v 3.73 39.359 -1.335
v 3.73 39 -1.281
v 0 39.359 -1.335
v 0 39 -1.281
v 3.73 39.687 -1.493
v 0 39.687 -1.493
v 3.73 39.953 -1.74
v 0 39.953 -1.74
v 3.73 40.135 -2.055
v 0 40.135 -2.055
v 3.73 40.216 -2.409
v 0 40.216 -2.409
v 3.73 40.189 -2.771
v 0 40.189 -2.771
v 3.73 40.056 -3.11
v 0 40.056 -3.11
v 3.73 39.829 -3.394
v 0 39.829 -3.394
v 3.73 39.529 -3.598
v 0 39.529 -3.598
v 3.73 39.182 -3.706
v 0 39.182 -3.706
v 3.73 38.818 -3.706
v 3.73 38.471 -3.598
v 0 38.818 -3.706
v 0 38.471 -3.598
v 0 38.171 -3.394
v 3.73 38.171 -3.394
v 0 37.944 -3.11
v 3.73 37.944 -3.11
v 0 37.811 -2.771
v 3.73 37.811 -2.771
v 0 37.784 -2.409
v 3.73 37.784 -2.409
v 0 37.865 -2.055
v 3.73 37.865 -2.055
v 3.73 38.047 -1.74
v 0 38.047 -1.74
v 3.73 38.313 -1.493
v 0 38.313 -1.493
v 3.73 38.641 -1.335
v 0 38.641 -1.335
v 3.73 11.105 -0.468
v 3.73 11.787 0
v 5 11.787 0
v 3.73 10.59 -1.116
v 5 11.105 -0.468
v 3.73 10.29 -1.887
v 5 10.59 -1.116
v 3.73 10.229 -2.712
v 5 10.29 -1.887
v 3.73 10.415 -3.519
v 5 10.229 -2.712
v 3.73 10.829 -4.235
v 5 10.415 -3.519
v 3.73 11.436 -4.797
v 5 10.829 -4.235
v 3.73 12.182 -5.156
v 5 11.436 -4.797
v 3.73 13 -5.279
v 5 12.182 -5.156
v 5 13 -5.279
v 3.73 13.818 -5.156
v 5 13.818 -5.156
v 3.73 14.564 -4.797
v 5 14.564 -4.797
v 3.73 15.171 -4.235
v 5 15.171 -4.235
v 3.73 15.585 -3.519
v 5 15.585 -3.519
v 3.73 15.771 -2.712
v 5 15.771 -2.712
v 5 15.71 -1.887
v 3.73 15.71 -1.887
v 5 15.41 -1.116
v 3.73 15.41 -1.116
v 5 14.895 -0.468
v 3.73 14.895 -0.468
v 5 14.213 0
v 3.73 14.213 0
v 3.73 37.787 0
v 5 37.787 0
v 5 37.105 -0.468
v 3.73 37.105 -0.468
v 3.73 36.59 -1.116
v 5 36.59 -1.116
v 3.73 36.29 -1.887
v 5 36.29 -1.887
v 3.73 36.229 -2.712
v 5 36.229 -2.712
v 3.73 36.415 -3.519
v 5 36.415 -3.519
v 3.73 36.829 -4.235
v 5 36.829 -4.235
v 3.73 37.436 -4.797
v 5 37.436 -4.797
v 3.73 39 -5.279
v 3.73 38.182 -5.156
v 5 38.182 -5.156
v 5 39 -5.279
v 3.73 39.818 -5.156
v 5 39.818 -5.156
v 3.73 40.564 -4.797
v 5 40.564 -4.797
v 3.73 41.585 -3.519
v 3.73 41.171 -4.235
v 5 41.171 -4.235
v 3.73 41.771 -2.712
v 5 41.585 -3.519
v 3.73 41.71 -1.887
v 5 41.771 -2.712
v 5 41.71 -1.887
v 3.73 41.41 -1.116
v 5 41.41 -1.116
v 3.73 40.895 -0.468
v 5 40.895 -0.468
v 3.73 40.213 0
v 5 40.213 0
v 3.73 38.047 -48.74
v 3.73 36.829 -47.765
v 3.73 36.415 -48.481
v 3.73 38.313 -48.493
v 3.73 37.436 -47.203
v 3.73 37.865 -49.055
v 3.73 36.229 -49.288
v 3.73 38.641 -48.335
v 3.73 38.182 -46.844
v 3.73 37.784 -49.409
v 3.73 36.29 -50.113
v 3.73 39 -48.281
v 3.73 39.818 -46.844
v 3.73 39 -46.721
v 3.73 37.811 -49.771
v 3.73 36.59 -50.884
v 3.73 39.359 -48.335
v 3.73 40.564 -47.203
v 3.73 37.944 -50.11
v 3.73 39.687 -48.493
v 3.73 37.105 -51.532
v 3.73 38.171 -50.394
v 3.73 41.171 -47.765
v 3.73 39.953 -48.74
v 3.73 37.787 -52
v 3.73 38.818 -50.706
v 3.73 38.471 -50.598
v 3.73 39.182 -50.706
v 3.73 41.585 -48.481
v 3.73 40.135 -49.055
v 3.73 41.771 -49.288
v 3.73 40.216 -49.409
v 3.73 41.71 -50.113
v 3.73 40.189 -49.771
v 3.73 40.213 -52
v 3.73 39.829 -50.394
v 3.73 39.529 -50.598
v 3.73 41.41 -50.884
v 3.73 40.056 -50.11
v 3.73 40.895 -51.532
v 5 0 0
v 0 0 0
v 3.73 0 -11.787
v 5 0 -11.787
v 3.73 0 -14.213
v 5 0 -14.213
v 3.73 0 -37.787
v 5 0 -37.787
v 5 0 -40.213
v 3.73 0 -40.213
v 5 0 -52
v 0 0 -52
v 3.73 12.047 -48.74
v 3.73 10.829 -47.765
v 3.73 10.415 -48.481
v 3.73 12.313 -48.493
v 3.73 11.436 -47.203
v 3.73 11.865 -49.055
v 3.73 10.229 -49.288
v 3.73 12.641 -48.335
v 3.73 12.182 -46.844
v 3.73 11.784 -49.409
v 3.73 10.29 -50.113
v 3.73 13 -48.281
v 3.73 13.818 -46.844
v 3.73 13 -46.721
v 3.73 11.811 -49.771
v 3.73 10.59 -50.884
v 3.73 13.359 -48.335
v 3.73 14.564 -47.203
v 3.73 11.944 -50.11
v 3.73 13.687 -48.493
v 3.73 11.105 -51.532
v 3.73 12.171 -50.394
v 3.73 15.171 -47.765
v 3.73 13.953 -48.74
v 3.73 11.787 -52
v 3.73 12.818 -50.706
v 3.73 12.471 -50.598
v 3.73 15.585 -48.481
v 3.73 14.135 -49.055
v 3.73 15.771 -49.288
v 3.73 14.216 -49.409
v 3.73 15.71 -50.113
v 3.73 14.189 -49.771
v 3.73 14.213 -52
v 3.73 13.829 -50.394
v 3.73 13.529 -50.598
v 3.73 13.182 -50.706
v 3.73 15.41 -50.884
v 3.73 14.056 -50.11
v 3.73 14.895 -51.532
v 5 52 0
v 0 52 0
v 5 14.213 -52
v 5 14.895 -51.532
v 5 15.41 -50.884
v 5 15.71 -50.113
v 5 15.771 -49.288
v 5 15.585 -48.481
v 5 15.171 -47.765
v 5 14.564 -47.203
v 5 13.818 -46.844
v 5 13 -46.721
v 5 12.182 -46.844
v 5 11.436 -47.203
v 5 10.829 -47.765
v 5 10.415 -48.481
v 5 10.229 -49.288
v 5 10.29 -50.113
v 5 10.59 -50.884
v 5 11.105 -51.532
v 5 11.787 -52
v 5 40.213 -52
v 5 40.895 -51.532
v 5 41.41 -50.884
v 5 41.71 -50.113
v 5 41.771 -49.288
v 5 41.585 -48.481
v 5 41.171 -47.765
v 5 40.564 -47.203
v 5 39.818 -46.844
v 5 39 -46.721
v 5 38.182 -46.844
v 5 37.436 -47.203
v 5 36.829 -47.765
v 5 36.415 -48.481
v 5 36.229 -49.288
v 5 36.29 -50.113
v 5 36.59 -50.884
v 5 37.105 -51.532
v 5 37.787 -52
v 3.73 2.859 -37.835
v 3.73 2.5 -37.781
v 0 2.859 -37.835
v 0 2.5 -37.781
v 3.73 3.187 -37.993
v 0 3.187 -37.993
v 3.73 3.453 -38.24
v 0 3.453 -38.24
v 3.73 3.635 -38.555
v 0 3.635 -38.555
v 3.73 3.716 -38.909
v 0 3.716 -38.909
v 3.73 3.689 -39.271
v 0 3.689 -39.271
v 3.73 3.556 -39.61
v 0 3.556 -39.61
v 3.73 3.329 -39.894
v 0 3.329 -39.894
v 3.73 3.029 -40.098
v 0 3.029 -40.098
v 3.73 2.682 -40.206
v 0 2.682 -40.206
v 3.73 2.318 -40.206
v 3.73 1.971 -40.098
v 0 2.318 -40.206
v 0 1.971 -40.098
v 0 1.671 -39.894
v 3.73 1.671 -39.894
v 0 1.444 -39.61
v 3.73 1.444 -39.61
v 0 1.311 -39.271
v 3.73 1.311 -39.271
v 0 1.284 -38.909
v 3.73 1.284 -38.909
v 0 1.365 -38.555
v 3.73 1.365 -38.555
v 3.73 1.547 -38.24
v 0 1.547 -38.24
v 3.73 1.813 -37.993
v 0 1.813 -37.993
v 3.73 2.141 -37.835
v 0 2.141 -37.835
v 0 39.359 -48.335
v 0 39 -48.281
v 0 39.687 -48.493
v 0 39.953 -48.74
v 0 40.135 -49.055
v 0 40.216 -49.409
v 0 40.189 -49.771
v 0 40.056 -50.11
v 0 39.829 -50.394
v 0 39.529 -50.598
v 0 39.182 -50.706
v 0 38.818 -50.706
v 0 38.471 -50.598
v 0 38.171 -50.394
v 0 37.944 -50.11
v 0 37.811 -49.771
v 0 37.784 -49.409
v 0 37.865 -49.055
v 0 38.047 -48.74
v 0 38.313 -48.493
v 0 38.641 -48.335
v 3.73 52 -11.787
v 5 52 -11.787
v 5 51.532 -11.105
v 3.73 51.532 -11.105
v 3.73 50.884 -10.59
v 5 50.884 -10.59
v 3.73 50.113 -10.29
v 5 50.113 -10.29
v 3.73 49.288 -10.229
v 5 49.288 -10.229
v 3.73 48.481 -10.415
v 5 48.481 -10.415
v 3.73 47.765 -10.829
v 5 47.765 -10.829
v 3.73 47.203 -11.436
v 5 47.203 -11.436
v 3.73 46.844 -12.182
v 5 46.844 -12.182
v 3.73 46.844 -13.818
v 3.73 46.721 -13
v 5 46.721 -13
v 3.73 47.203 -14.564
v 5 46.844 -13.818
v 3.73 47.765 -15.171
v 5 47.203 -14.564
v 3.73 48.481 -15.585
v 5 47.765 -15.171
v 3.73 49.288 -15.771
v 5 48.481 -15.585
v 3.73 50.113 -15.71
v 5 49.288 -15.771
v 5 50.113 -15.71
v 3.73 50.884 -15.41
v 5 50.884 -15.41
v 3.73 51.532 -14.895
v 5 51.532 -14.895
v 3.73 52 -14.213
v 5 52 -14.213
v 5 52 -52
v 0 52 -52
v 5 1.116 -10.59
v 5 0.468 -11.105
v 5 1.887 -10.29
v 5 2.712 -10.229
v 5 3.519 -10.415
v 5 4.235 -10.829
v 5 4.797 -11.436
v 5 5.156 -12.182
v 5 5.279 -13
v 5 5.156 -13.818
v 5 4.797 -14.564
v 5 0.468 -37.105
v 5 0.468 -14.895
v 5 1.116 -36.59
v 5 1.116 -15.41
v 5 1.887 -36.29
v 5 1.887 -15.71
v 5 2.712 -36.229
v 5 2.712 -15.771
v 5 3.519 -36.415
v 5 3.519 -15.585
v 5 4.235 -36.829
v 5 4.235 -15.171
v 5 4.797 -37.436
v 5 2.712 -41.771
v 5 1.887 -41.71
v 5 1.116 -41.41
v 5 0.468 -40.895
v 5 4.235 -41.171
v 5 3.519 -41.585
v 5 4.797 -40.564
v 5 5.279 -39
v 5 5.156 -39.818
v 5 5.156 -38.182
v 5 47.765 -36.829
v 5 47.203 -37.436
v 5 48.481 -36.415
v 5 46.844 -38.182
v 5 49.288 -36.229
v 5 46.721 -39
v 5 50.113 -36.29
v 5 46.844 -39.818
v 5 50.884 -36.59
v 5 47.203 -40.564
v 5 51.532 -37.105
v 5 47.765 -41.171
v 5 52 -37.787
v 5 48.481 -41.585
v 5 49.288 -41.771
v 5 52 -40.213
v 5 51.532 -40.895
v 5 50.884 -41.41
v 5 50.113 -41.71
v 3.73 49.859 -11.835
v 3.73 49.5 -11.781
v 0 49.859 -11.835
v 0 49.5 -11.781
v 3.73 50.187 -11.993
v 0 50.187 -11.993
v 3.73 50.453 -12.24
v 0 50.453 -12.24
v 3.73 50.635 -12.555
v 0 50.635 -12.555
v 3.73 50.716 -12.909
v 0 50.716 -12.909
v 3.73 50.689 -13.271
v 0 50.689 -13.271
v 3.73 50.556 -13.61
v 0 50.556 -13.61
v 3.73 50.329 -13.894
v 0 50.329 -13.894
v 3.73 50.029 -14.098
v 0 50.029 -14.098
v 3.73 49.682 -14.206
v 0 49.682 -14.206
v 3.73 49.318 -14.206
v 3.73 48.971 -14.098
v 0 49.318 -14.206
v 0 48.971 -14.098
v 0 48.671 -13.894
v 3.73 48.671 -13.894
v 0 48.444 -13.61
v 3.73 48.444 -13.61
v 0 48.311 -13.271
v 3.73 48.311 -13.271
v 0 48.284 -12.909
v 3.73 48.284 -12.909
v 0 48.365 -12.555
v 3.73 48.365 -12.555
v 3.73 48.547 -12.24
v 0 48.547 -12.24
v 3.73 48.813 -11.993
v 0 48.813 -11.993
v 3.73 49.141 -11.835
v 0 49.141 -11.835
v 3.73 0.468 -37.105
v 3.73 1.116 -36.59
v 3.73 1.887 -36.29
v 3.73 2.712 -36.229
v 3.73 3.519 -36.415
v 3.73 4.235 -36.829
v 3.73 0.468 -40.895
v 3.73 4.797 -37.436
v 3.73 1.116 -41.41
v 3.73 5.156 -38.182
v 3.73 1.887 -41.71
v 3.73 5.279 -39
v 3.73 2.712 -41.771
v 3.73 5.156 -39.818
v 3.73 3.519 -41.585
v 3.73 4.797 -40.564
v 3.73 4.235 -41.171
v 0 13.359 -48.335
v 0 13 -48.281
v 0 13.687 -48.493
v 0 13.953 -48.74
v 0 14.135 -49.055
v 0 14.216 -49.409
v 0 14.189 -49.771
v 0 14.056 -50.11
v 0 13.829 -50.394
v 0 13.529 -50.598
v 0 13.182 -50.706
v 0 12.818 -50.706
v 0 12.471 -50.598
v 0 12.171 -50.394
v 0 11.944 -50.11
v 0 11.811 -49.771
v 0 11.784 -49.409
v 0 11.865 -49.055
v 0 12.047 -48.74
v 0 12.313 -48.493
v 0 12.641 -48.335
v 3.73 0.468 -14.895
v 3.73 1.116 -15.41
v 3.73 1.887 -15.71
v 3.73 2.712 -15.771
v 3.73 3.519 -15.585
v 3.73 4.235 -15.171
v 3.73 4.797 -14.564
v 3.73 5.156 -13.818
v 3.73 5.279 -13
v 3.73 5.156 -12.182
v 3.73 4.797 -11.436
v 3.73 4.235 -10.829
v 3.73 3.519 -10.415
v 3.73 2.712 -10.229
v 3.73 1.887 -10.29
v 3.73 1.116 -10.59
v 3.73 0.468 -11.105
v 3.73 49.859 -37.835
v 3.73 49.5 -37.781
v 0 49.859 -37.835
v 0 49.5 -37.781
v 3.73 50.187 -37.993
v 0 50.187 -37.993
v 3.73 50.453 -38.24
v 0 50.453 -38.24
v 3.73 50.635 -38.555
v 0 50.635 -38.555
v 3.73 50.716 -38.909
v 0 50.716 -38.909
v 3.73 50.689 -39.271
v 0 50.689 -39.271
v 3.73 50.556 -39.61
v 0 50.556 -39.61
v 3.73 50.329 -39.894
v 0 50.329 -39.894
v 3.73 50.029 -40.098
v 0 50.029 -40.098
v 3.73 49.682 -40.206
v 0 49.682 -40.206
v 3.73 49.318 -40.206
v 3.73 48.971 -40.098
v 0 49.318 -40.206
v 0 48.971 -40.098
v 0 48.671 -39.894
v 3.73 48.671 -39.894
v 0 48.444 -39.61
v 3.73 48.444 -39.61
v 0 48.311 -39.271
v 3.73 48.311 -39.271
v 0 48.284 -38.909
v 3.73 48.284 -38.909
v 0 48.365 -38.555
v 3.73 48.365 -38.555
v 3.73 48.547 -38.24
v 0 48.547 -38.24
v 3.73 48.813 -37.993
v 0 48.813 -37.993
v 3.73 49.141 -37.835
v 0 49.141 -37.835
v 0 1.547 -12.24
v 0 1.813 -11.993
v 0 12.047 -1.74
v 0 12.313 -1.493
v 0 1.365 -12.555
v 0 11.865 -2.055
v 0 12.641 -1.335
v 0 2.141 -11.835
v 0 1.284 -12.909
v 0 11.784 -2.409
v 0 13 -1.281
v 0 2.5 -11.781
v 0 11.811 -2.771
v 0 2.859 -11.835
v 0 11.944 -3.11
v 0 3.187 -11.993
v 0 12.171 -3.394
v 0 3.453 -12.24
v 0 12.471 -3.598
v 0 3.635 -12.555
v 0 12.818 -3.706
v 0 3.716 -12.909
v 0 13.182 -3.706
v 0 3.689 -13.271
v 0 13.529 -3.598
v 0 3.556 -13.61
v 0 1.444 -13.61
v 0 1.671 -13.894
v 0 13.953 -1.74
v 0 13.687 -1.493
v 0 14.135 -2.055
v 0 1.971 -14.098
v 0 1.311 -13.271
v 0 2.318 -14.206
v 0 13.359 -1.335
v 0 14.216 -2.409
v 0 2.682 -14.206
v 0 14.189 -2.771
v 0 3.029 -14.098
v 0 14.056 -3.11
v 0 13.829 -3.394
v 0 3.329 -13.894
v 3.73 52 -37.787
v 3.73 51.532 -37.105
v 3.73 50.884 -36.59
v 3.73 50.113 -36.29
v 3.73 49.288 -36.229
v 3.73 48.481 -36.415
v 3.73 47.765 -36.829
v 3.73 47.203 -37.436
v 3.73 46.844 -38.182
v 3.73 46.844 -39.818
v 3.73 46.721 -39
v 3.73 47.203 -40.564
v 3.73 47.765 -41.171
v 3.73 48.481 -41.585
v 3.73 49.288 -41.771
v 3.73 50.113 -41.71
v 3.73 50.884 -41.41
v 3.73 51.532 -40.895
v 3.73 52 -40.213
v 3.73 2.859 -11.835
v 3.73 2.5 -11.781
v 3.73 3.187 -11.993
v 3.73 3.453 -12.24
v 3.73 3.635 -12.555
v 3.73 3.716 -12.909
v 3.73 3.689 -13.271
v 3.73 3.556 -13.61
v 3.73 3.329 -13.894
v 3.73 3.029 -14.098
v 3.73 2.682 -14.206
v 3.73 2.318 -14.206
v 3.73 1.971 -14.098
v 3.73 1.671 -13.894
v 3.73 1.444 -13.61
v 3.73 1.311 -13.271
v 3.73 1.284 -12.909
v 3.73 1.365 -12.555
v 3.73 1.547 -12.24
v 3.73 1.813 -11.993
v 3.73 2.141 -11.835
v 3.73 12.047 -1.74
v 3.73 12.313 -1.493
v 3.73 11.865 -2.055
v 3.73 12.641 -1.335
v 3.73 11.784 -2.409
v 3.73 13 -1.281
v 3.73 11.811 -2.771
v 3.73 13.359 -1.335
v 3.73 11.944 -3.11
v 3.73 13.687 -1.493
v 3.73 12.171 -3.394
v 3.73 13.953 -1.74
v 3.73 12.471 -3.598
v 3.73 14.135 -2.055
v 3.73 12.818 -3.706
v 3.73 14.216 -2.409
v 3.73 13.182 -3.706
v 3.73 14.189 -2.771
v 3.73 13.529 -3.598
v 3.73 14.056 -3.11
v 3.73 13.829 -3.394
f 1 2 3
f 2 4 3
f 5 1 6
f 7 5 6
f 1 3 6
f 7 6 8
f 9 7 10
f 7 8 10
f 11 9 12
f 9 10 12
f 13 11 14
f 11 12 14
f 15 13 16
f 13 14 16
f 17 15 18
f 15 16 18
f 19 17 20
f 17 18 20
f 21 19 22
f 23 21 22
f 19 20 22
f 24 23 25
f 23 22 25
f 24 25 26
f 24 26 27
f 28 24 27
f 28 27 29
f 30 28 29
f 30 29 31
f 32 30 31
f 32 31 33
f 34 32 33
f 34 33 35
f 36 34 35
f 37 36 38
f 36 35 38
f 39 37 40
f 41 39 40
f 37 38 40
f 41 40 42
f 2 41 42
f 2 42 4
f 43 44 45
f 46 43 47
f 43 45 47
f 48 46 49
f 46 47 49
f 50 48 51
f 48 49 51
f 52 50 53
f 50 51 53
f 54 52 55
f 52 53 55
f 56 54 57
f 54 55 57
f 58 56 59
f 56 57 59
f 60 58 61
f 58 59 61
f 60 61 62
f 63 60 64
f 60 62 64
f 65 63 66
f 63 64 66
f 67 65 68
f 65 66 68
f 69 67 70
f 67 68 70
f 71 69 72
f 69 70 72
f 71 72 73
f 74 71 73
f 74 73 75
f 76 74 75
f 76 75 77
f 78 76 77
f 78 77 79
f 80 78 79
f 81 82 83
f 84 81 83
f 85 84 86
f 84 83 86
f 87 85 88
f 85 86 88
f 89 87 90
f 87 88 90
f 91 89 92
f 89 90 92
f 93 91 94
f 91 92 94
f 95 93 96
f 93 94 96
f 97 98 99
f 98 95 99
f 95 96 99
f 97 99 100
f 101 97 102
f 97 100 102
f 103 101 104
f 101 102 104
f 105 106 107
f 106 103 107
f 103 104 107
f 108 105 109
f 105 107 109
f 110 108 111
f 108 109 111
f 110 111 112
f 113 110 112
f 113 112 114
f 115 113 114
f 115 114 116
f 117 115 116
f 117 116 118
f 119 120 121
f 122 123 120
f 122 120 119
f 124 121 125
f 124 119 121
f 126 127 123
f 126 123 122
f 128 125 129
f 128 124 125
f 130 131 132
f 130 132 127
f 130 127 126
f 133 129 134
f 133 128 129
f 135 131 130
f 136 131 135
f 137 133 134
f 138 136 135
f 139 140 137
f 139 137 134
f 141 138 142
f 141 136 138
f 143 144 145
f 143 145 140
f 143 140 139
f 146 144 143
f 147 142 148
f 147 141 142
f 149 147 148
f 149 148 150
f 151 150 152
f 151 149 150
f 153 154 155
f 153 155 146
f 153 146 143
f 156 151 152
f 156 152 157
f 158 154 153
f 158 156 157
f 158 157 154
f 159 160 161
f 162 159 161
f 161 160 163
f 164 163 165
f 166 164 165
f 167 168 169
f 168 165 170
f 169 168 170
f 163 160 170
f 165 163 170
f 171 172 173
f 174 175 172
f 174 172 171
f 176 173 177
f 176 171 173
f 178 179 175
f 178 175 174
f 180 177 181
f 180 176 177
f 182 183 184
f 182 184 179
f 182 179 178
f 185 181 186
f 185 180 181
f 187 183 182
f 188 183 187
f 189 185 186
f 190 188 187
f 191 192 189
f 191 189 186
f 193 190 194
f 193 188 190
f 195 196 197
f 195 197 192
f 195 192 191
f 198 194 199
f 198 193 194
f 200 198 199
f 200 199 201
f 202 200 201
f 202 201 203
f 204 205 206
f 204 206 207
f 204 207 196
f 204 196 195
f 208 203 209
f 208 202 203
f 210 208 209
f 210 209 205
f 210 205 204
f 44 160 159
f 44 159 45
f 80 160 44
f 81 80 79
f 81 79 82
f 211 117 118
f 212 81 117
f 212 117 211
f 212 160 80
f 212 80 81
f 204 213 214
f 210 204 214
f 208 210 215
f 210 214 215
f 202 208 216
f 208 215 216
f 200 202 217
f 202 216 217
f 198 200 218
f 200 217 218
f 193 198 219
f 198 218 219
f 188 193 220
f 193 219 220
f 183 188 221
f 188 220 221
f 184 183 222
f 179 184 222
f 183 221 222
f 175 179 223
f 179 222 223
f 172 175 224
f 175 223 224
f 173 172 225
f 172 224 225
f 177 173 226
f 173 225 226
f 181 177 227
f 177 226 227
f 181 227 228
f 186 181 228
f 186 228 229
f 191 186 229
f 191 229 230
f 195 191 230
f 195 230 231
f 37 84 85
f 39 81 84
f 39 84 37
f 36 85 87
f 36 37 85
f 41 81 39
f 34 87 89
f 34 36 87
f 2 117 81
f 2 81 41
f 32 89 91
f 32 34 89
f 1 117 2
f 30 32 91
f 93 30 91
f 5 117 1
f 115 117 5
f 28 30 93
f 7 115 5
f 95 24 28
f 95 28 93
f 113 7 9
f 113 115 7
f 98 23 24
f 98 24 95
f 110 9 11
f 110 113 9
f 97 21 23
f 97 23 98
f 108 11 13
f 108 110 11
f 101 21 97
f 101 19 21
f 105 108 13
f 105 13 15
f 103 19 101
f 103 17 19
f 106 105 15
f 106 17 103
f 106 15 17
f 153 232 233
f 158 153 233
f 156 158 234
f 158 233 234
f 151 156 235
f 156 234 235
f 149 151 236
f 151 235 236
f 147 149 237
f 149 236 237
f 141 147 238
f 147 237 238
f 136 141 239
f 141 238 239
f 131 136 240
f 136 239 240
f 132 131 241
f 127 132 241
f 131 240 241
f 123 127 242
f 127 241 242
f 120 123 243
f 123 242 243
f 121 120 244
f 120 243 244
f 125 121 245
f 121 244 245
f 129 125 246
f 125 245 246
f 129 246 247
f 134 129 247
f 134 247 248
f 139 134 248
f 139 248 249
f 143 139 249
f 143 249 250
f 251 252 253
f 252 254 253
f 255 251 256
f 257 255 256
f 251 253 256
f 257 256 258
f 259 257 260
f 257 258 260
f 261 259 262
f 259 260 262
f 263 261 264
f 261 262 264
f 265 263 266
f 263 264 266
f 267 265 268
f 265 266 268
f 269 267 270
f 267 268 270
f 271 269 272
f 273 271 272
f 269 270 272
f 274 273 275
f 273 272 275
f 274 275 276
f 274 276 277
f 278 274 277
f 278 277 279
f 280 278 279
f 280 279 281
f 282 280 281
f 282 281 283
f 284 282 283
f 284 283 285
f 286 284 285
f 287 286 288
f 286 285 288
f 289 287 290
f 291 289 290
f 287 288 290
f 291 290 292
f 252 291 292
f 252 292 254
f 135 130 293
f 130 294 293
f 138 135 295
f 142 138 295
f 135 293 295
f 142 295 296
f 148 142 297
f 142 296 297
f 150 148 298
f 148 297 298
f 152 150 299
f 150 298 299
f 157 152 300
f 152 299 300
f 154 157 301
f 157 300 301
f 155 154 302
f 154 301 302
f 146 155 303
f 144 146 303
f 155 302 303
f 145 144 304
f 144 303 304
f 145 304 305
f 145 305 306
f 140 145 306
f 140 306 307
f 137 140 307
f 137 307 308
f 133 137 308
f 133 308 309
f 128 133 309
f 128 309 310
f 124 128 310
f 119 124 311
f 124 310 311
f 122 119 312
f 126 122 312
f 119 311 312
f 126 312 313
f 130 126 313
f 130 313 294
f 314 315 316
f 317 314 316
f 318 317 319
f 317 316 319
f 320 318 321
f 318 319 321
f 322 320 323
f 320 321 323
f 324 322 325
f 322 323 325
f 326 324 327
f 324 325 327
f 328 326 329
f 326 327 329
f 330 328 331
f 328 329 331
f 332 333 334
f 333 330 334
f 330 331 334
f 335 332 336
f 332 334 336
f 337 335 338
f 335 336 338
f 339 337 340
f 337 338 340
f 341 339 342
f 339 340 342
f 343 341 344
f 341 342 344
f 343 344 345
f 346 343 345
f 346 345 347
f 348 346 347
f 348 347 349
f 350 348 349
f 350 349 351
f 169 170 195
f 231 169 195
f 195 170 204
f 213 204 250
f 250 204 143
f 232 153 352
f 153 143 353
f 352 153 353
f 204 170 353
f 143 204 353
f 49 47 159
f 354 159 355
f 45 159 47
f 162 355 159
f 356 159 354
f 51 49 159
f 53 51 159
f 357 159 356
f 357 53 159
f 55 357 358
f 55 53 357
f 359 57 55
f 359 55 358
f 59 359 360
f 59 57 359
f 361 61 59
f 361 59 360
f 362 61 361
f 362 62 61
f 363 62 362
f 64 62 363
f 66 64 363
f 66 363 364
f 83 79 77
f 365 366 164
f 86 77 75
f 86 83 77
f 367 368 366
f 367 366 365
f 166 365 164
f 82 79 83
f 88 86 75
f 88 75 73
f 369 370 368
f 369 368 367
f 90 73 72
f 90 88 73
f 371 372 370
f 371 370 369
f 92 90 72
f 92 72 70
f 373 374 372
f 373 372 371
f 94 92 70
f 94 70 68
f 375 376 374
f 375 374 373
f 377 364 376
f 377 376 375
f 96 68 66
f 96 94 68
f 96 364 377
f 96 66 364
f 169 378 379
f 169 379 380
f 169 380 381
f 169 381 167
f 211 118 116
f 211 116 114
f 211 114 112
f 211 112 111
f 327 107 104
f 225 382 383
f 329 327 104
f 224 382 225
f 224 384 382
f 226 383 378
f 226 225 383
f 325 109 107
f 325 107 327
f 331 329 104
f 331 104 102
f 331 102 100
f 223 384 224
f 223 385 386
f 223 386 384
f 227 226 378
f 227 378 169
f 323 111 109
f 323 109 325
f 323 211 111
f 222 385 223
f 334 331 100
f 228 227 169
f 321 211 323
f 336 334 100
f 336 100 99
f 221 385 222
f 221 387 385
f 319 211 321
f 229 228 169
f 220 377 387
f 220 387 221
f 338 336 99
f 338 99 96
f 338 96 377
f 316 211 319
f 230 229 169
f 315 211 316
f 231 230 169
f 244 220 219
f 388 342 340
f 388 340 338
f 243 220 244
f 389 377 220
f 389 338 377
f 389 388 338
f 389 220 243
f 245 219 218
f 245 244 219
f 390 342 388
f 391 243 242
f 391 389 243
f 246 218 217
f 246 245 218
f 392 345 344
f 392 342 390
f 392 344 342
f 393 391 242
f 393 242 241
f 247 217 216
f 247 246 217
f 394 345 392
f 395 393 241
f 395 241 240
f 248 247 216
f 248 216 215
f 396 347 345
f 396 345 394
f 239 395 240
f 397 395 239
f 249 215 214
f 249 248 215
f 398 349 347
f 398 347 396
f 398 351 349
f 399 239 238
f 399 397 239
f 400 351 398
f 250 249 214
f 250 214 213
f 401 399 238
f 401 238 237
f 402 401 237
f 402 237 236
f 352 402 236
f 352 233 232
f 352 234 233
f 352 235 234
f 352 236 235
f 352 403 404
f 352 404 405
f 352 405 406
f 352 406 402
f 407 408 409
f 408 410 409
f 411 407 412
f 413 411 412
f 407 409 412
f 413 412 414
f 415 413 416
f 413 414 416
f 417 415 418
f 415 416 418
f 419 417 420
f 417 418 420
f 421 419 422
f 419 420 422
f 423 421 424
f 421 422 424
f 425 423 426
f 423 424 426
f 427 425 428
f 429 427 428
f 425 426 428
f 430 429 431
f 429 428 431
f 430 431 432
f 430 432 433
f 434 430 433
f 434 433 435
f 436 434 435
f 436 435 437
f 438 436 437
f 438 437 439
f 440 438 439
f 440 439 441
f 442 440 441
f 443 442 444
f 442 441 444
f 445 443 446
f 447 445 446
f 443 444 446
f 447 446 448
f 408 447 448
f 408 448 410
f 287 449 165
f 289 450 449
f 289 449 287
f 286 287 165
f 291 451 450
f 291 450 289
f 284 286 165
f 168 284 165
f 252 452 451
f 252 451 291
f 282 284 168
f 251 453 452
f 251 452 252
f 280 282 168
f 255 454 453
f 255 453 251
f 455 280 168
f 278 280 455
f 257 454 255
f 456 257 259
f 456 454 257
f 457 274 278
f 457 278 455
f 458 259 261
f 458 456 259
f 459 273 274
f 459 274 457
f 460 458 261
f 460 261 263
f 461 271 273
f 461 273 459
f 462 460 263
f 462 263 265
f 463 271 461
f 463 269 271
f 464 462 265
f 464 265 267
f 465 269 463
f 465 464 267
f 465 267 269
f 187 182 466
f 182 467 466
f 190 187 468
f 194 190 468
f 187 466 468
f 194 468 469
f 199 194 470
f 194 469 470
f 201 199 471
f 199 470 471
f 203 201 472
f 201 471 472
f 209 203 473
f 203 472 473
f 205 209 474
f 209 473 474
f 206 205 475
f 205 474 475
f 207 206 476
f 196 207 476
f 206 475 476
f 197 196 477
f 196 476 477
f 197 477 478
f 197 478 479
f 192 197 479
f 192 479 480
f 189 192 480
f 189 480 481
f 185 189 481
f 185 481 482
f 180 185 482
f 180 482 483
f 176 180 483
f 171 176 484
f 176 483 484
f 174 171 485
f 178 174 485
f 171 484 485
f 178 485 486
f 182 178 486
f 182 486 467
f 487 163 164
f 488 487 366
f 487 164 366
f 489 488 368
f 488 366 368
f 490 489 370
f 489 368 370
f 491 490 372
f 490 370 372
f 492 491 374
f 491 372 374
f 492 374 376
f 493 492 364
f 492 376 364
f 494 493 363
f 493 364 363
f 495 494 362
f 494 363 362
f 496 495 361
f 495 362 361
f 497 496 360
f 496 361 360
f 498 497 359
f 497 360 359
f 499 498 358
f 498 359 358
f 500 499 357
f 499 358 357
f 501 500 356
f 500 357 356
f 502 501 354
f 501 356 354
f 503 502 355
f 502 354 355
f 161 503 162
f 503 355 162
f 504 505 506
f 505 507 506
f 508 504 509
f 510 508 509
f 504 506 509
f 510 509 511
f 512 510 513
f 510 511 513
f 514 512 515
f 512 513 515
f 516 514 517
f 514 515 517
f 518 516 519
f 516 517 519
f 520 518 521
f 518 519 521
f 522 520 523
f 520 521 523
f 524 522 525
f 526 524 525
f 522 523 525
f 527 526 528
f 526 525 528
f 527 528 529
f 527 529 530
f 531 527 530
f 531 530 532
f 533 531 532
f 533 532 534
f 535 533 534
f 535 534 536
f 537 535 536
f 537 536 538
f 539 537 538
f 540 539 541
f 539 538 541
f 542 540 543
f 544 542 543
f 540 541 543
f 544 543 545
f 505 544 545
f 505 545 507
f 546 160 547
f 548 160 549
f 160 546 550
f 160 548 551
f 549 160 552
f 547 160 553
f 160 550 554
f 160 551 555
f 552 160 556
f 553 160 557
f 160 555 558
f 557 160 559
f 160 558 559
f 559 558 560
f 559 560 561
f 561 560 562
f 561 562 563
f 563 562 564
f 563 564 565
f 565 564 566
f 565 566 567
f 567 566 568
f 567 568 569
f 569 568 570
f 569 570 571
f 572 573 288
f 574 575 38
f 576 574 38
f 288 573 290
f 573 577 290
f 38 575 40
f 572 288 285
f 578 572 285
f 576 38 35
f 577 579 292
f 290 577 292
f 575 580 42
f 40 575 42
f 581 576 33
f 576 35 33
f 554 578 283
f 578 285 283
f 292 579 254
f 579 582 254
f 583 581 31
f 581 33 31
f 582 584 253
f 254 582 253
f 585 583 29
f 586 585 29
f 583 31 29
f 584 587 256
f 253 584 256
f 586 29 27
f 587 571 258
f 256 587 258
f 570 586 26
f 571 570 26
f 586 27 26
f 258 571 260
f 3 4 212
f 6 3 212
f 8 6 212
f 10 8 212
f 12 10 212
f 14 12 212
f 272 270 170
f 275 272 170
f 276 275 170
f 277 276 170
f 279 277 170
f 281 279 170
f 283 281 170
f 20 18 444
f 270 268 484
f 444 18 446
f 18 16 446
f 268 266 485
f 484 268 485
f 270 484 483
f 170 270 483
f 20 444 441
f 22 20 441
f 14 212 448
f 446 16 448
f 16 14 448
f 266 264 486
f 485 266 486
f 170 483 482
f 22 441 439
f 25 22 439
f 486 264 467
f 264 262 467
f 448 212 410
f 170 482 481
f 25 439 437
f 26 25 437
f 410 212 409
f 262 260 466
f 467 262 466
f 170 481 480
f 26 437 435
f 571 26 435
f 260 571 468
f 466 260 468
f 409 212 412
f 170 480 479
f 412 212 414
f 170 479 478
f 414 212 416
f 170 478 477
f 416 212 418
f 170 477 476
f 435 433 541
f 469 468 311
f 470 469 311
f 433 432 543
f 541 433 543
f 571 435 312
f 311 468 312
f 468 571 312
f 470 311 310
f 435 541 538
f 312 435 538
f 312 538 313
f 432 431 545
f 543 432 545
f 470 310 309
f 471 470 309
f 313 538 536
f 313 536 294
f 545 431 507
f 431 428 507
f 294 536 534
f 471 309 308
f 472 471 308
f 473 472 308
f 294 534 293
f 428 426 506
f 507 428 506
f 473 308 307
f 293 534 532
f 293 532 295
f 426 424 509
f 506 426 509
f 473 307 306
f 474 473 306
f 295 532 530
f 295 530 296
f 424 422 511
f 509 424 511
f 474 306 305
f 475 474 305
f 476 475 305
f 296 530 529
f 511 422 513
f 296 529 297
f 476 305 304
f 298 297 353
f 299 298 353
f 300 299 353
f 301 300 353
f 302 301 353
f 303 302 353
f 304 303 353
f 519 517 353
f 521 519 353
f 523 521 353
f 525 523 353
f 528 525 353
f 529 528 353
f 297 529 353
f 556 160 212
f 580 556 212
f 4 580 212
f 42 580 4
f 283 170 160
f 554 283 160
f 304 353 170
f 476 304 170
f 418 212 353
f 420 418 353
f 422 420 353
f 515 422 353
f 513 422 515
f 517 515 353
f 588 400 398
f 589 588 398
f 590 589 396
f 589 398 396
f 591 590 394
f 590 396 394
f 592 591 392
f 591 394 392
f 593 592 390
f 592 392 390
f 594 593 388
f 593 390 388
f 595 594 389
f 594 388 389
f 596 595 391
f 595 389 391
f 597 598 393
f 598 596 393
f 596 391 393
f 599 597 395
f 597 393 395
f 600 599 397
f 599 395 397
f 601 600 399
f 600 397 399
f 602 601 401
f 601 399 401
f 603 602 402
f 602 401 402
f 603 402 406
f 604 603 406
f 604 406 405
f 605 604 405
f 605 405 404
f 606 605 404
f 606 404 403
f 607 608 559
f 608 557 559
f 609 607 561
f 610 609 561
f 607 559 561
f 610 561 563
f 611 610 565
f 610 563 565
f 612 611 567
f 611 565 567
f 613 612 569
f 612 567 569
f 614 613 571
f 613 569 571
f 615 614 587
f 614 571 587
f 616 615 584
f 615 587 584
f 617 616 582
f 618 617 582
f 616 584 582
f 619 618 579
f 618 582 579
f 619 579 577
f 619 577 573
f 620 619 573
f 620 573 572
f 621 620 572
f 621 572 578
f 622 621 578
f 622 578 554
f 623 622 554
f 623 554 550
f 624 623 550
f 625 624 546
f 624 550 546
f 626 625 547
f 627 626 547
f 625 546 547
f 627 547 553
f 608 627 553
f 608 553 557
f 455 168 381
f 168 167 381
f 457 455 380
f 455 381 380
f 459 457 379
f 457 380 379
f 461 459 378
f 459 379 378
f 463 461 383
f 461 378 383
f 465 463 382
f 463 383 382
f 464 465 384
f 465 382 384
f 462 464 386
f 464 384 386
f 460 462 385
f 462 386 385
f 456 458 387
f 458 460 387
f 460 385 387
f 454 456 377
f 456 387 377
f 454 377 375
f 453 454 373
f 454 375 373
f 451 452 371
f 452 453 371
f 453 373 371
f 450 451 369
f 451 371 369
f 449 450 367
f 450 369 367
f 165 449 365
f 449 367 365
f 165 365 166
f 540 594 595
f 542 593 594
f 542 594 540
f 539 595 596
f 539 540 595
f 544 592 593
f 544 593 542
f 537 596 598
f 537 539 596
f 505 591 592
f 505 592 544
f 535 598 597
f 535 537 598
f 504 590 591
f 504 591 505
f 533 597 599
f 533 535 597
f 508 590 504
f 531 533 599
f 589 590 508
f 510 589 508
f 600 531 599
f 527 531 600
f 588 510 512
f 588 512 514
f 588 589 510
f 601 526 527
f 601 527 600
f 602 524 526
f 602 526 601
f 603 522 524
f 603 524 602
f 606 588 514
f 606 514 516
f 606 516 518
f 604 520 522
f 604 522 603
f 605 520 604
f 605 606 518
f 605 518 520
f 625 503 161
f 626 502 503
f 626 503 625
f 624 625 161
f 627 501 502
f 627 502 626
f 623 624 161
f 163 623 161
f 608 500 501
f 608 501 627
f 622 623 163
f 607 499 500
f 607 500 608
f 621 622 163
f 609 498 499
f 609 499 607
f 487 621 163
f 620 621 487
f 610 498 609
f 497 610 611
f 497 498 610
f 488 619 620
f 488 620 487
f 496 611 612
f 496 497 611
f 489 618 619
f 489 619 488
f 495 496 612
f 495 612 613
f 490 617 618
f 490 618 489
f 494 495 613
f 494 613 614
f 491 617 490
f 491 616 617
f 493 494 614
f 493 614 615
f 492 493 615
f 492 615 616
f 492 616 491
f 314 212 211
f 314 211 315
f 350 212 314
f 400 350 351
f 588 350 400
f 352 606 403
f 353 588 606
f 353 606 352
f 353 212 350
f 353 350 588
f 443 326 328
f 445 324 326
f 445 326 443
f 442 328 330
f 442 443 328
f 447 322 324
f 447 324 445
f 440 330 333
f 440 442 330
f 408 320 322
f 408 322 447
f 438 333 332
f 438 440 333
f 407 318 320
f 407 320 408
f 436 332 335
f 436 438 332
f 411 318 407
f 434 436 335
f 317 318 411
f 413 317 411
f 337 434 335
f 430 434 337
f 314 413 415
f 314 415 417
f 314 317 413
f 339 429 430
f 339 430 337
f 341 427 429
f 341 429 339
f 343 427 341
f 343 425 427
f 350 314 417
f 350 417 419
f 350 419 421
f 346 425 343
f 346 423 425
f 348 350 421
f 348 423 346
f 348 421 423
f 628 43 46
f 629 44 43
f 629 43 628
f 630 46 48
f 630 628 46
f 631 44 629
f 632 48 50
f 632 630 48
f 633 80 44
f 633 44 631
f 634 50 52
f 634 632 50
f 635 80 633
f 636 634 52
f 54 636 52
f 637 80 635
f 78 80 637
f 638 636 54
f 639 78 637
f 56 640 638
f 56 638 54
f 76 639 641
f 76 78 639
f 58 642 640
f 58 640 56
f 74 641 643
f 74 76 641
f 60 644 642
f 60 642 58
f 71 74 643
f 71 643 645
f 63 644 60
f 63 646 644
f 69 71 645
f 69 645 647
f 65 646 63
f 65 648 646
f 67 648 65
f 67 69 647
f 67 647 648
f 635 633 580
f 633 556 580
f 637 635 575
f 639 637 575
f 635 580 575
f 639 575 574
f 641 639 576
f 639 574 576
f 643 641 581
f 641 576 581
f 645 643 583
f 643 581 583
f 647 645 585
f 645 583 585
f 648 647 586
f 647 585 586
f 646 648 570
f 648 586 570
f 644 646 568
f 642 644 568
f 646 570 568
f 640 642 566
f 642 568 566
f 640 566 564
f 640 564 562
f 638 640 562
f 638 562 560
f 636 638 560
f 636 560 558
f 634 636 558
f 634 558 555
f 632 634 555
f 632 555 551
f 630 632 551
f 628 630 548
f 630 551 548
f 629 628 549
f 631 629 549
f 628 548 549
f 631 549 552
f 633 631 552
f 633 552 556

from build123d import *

# Parameters (mm, degrees)
SKETCH1_W                                           = 52
SKETCH1_H                                           = 52
BOSS_EXTRUDE1_DEPTH                                 = 5
CBORE_FOR_2_BINDING_HEAD_MACHINE_SCREW1_D           = 2.4384
CBORE_FOR_2_BINDING_HEAD_MACHINE_SCREW1_CBORE_D     = 5.55752
CBORE_FOR_2_BINDING_HEAD_MACHINE_SCREW1_CBORE_DEPTH = 1.27


with BuildPart() as part:
    # Sketch1 → Boss-Extrude1 (new body)
    with BuildSketch(Plane(origin=(0, 0, 0), x_dir=(0, 0, -1), z_dir=(1, 0, 0))):
        with Locations((26, 26)):
            Rectangle(SKETCH1_W, SKETCH1_H)
    extrude(amount=BOSS_EXTRUDE1_DEPTH)

    # CBORE for #2 Binding Head Machine Screw1 (through all)
    with Locations(Plane(origin=(5, 0, 0), x_dir=(0, 0, -1), z_dir=(1, 0, 0))):
        with Locations((13, 49.5), (39, 49.5), (49.5, 39), (49.5, 13), (39, 2.5), (13, 2.5), (2.5, 13), (2.5, 39)):
            CounterBoreHole(CBORE_FOR_2_BINDING_HEAD_MACHINE_SCREW1_D / 2, CBORE_FOR_2_BINDING_HEAD_MACHINE_SCREW1_CBORE_D / 2, CBORE_FOR_2_BINDING_HEAD_MACHINE_SCREW1_CBORE_DEPTH)


solid = part.part
